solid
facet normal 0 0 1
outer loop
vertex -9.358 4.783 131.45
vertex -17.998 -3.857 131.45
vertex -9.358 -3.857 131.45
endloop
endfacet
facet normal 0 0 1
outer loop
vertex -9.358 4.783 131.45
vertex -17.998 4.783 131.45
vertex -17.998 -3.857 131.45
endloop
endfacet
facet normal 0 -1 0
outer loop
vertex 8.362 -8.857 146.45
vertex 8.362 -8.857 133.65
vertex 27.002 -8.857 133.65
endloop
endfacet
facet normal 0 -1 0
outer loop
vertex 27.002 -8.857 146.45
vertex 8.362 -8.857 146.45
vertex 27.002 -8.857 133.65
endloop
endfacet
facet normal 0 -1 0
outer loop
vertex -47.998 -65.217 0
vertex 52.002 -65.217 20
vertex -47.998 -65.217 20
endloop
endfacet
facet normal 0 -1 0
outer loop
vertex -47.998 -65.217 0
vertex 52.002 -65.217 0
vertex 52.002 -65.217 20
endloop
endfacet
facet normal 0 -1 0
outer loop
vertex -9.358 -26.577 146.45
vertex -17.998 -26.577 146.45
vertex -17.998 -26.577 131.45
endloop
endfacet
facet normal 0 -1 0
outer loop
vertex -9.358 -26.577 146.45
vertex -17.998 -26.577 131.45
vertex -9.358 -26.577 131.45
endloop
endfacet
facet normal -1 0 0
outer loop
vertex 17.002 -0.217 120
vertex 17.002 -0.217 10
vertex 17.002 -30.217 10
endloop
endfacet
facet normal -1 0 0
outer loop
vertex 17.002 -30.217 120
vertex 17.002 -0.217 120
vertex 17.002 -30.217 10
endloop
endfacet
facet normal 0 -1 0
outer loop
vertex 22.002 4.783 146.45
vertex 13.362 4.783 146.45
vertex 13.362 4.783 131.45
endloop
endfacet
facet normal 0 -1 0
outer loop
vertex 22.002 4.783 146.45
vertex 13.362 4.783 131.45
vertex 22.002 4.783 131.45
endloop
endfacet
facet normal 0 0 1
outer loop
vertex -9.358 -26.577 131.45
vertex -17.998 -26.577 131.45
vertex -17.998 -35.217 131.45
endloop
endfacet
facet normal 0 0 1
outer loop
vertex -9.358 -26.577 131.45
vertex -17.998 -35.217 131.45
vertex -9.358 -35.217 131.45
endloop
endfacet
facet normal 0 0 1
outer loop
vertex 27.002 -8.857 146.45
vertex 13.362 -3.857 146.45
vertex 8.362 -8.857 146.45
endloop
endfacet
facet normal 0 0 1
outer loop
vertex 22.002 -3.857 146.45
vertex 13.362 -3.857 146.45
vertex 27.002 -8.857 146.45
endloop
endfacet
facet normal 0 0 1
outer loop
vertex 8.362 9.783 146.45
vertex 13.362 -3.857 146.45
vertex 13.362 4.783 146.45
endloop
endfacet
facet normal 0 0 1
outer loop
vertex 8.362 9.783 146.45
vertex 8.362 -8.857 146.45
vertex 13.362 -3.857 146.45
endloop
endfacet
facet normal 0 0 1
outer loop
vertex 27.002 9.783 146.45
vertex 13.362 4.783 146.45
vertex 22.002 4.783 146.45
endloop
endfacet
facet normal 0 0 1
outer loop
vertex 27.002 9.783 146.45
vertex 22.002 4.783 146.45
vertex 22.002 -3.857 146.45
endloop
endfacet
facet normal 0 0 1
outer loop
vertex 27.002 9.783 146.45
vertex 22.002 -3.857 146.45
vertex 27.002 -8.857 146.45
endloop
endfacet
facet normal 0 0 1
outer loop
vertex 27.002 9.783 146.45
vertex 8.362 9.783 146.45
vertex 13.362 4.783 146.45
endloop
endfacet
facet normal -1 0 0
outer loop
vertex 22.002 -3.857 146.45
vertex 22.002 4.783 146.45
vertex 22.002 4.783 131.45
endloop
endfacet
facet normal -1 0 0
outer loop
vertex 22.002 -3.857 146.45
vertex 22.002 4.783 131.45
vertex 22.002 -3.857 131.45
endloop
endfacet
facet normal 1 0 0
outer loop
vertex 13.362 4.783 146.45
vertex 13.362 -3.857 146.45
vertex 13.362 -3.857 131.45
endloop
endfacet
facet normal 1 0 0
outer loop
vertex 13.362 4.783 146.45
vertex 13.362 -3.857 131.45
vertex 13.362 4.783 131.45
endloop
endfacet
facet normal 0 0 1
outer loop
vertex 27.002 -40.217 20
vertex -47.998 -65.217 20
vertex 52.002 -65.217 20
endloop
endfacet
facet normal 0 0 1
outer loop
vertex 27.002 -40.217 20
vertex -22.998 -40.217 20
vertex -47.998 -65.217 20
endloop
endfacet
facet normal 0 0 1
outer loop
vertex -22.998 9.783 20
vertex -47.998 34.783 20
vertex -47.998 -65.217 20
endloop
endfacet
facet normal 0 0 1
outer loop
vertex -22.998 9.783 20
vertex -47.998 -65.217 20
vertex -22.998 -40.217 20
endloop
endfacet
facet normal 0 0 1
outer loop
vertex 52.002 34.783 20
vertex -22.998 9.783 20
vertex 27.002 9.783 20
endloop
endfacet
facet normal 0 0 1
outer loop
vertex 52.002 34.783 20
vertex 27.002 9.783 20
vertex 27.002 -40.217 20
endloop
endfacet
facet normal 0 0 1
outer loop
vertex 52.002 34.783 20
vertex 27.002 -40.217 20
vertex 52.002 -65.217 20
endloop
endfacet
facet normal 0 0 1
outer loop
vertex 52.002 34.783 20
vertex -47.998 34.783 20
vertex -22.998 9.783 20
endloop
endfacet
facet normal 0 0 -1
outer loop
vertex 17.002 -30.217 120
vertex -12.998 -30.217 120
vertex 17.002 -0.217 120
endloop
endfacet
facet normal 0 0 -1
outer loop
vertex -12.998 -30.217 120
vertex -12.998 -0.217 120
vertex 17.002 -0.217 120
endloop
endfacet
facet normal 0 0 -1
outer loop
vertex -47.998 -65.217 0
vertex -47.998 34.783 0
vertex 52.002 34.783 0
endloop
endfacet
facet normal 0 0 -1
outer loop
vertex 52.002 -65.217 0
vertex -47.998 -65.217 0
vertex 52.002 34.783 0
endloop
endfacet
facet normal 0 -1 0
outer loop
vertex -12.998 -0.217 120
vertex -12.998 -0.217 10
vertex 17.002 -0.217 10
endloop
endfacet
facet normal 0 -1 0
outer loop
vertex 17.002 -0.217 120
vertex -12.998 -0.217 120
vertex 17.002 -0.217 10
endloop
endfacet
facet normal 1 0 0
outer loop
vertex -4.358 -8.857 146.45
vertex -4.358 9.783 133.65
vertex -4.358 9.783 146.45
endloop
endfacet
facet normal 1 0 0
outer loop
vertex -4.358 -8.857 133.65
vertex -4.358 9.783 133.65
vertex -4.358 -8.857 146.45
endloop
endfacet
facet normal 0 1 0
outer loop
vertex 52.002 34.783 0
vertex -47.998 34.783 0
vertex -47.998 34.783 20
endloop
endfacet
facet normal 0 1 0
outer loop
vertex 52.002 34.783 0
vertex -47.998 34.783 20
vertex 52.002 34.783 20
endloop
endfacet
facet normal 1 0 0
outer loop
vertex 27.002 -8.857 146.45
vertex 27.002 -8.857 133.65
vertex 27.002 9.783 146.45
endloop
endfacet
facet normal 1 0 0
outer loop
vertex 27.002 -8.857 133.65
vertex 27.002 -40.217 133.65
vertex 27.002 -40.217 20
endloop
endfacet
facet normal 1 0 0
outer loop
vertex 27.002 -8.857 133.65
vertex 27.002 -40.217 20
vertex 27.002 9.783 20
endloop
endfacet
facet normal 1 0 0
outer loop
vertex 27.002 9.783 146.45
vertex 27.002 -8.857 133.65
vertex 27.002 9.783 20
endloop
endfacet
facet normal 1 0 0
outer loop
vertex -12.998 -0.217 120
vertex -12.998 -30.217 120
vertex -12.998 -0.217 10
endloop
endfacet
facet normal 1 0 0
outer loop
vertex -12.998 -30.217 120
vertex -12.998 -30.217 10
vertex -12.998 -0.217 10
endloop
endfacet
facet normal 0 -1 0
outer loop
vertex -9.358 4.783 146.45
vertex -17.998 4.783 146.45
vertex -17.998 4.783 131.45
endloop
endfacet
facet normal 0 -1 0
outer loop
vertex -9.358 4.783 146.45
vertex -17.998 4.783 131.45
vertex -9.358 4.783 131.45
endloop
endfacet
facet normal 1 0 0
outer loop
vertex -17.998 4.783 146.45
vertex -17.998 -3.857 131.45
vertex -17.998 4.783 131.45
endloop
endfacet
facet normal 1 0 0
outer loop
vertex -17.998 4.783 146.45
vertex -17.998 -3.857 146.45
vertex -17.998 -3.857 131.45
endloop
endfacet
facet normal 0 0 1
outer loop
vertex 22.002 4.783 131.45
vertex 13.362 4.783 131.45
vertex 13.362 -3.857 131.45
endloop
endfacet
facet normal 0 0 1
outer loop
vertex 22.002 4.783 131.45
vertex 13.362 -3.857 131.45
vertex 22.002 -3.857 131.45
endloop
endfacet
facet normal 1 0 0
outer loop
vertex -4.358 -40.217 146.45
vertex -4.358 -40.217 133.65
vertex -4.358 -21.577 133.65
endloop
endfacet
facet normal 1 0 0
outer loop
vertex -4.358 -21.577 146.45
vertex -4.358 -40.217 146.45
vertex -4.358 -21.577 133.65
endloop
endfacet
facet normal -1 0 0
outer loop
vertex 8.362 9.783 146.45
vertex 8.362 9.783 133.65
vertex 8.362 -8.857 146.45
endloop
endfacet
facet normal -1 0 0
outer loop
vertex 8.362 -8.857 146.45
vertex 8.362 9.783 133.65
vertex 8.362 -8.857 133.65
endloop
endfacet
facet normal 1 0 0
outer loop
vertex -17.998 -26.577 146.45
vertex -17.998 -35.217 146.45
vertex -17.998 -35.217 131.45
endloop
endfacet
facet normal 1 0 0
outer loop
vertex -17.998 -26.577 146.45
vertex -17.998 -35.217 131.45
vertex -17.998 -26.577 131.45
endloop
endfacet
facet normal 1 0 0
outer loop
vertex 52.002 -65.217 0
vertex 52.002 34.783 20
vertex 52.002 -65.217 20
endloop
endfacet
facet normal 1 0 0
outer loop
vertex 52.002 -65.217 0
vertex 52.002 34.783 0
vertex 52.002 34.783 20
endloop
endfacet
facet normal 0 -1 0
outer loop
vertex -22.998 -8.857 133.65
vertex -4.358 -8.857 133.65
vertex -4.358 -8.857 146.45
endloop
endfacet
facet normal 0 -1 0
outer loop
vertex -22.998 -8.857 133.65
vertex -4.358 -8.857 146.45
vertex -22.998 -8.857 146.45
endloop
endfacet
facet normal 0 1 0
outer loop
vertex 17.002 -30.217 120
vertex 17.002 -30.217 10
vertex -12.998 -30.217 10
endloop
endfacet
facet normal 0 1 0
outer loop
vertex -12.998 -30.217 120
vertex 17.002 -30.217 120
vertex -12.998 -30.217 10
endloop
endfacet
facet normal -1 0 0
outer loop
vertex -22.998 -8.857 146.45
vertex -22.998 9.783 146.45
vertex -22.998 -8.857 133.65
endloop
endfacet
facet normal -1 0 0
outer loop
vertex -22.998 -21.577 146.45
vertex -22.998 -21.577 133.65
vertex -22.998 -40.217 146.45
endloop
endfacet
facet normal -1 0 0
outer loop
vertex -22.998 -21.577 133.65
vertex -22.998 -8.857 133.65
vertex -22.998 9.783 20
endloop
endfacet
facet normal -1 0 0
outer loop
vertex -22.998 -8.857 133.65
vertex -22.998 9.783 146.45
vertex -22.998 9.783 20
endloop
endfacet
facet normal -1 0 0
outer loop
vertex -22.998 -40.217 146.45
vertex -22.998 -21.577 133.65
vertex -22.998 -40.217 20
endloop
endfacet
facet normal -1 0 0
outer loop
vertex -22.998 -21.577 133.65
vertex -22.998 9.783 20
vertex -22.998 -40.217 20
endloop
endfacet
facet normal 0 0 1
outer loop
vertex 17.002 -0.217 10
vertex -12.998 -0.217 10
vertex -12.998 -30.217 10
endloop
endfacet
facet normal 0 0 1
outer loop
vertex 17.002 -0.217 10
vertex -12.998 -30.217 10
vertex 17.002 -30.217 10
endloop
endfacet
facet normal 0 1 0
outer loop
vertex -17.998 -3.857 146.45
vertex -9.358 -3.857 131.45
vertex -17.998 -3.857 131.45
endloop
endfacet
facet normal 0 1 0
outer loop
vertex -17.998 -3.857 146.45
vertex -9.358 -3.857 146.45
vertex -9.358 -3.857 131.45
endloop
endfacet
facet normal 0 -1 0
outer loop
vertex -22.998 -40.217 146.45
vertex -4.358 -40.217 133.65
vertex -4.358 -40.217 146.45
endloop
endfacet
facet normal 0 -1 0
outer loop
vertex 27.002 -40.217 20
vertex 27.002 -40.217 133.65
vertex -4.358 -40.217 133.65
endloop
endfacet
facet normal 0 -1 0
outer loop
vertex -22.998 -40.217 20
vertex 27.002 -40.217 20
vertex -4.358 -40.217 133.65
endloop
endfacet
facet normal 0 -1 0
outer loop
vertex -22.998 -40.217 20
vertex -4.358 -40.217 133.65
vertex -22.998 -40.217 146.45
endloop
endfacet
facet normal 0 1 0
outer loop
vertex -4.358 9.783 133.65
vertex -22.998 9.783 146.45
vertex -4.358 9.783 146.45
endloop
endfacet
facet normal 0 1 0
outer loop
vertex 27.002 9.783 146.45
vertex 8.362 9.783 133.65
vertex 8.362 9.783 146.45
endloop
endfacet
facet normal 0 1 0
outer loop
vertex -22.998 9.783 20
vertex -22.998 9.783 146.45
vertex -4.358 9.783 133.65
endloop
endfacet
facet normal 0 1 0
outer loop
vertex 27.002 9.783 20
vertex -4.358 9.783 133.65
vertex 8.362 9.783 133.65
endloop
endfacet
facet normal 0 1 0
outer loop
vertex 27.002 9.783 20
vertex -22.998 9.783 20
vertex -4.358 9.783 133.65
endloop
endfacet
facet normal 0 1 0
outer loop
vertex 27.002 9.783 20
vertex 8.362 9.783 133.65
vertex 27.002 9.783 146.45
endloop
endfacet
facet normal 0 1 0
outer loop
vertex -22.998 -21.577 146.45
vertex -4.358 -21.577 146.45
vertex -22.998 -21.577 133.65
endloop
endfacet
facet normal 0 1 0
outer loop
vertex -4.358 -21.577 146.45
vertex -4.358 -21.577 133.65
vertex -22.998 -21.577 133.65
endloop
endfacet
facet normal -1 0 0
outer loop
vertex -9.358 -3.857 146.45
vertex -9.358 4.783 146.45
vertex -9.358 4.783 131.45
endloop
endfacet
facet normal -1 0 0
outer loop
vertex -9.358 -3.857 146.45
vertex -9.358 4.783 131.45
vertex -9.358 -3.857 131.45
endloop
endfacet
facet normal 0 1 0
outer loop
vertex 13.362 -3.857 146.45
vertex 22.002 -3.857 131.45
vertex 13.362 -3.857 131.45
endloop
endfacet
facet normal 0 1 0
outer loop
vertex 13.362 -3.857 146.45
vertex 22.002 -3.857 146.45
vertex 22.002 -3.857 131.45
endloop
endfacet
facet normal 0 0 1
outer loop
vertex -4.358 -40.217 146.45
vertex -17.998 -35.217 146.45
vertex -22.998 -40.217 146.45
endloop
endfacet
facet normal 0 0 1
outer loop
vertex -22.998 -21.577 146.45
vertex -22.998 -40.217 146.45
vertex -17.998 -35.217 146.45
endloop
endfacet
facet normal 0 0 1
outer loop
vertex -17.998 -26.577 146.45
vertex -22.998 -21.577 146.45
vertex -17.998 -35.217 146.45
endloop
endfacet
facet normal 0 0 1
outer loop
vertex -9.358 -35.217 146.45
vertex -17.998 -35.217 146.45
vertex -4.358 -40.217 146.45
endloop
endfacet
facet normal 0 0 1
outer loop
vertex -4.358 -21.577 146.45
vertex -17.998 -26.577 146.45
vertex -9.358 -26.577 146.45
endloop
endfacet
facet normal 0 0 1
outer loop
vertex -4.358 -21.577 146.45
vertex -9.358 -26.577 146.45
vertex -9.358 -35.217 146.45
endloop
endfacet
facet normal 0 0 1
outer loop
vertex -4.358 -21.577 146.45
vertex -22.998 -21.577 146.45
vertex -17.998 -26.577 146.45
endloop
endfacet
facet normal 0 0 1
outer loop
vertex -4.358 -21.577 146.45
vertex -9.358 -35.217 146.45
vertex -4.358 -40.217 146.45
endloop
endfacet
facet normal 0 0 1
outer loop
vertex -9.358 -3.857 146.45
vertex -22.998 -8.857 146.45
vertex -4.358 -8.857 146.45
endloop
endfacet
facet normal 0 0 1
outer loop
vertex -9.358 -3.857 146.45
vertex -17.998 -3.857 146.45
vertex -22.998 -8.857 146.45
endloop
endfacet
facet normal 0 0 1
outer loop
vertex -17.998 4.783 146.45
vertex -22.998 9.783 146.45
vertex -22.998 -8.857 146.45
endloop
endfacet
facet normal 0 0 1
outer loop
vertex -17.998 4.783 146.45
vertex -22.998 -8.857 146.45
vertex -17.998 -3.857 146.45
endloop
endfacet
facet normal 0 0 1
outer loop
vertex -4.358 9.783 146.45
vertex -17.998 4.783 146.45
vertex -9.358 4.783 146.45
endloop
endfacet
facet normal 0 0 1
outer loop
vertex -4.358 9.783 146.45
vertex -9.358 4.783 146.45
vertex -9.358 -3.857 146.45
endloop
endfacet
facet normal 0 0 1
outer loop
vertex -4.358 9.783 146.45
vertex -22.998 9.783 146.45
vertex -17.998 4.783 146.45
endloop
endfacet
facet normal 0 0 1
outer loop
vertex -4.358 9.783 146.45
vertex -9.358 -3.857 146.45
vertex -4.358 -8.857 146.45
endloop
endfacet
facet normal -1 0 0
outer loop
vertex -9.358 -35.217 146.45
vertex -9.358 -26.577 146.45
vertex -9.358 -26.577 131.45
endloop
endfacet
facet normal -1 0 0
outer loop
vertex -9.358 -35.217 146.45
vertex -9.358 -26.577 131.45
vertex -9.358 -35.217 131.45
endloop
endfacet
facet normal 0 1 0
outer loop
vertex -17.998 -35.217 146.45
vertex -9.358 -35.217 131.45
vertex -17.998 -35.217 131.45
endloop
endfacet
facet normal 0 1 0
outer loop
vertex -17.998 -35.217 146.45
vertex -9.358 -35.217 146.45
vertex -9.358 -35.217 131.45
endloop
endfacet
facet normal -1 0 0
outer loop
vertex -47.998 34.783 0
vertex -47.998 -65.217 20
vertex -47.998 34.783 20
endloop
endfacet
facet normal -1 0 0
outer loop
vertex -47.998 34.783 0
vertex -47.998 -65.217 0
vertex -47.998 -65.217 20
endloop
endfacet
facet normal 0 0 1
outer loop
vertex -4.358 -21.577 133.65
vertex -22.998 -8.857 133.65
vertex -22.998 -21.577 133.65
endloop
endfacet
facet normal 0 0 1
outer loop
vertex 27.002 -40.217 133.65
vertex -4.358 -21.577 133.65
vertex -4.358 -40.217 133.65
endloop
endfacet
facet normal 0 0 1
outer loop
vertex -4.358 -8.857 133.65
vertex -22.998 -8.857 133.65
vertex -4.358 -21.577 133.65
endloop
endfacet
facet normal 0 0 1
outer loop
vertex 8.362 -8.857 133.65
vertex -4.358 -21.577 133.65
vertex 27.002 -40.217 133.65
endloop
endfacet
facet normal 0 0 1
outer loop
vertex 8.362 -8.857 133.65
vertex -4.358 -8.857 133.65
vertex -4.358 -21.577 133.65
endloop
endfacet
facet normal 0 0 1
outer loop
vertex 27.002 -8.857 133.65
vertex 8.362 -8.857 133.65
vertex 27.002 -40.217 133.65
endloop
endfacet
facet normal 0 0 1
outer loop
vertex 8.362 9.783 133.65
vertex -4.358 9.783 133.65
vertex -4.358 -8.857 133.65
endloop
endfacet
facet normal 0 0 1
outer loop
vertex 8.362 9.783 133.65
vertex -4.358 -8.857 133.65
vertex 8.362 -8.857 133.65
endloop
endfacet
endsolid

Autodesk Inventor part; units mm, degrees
ref_plane "YZ Plane" through (0, 0, 0) normal (1, 0, 0) x (0, 1, 0)
ref_plane "XZ Plane" through (0, 0, 0) normal (0, 1, 0) x (-1, 0, 0)
ref_plane "XY Plane" through (0, 0, 0) normal (0, 0, 1) x (1, 0, 0)
sketch "Sketch1" plane through (0, 0, 0) normal (0, 0, 1) x (1, 0, 0)
  line L0 (-47.9977, 34.7826) -> (52.0023, 34.7826)
  line L1 (52.0023, 34.7826) -> (52.0023, -65.2174)
  line L2 (52.0023, -65.2174) -> (-47.9977, -65.2174)
  line L3 (-47.9977, -65.2174) -> (-47.9977, 34.7826)
  point P0 (0, 0)
  dimension "d0" = 100
  dimension "d1" = 100
  dimension "d2" = 100
extrude "Extrusion1" add sketch "Sketch1" along normal blind 20
sketch "Sketch2" plane through (0, 0, 20) normal (0, 0, 1) x (1, 0, 0)
  line L0 (-22.9977, 9.7826) -> (27.0023, 9.7826)
  line L1 (27.0023, 9.7826) -> (27.0023, -40.2174)
  line L2 (27.0023, -40.2174) -> (-22.9977, -40.2174)
  line L3 (-22.9977, -40.2174) -> (-22.9977, 9.7826)
  line L4 (52.0023, 34.7826) -> (-47.9977, 34.7826) projected
  line L5 (-47.9977, 34.7826) -> (-47.9977, -65.2174) projected
  line L6 (-47.9977, -65.2174) -> (52.0023, -65.2174) projected
  line L7 (52.0023, -65.2174) -> (52.0023, 34.7826) projected
  point P0 (0, 0)
  dimension "d5" = 25
  dimension "d6" = 25
  dimension "d7" = 25
  dimension "d8" = 25
extrude "Extrusion2" add sketch "Sketch2" along normal blind 100 contours L0 L1 L2 L3
shell "Shell1" thickness 10 removed faces 1 at (-6.331, -6.8841, 120)
sketch "Sketch3" plane through (0, 0, 120) normal (0, 0, 1) x (1, 0, 0)
  line L0 (-22.9977, 9.7826) -> (-22.9977, -40.2174) projected
  line L1 (27.0023, -40.2174) -> (27.0023, 9.7826) projected
  line L2 (-22.9977, 9.7826) -> (27.0023, 9.7826)
  line L3 (27.0023, 9.7826) -> (27.0023, -40.2174)
  line L4 (27.0023, -40.2174) -> (-22.9977, -40.2174)
  line L5 (-22.9977, -40.2174) -> (-22.9977, 9.7826)
  point P0 (0, 0)
extrude "Extrusion3" add sketch "Sketch3" along normal blind 13.65
sketch "Sketch4" plane through (0, 0, 133.65) normal (0, 0, 1) x (1, 0, 0)
  line L0 (-22.9977, 9.7826) -> (-4.3577, 9.7826)
  line L1 (-4.3577, 9.7826) -> (-4.3577, -8.8574)
  line L2 (-4.3577, -8.8574) -> (-22.9977, -8.8574)
  line L3 (-22.9977, -8.8574) -> (-22.9977, 9.7826)
  line L4 (27.0023, 9.7826) -> (8.3623, 9.7826)
  line L5 (8.3623, 9.7826) -> (8.3623, -8.8574)
  line L6 (8.3623, -8.8574) -> (27.0023, -8.8574)
  line L7 (27.0023, -8.8574) -> (27.0023, 9.7826)
  line L8 (27.0023, -40.2174) -> (-22.9977, -40.2174) projected
  line L9 (-22.9977, -40.2174) -> (-4.3577, -40.2174)
  line L10 (-4.3577, -40.2174) -> (-4.3577, -21.5774)
  line L11 (-4.3577, -21.5774) -> (-22.9977, -21.5774)
  line L12 (-22.9977, -21.5774) -> (-22.9977, -40.2174)
  point P0 (0, 0)
  dimension "d14" = 18.64
  dimension "d15" = 18.64
  dimension "d16" = 18.64
  dimension "d17" = 18.64
  dimension "d18" = 18.64
extrude "Extrusion4" add sketch "Sketch4" along normal blind 12.8
sketch "Sketch5" plane through (0, 0, 146.45) normal (0, 0, 1) x (1, 0, 0)
  line L0 (13.3623, 4.7826) -> (22.0023, 4.7826)
  line L1 (22.0023, 4.7826) -> (22.0023, -3.8574)
  line L2 (22.0023, -3.8574) -> (13.3623, -3.8574)
  line L3 (13.3623, -3.8574) -> (13.3623, 4.7826)
  line L4 (-17.9977, 4.7826) -> (-9.3577, 4.7826)
  line L5 (-9.3577, 4.7826) -> (-9.3577, -3.8574)
  line L6 (-9.3577, -3.8574) -> (-17.9977, -3.8574)
  line L7 (-17.9977, -3.8574) -> (-17.9977, 4.7826)
  line L8 (-17.9977, -26.5774) -> (-9.3577, -26.5774)
  line L9 (-9.3577, -26.5774) -> (-9.3577, -35.2174)
  line L10 (-9.3577, -35.2174) -> (-17.9977, -35.2174)
  line L11 (-17.9977, -35.2174) -> (-17.9977, -26.5774)
  line L12 (-4.3577, 9.7826) -> (-22.9977, 9.7826) projected
  line L13 (-22.9977, 9.7826) -> (-22.9977, -8.8574) projected
  line L14 (-22.9977, -8.8574) -> (-4.3577, -8.8574) projected
  line L15 (-4.3577, -8.8574) -> (-4.3577, 9.7826) projected
  line L16 (27.0023, 9.7826) -> (8.3623, 9.7826) projected
  line L17 (27.0023, -8.8574) -> (27.0023, 9.7826) projected
  line L18 (8.3623, 9.7826) -> (8.3623, -8.8574) projected
  line L19 (-4.3577, -21.5774) -> (-22.9977, -21.5774) projected
  line L20 (-22.9977, -40.2174) -> (-4.3577, -40.2174) projected
  point P0 (0, 0)
  dimension "d21" = 5
  dimension "d22" = 5
  dimension "d23" = 5
  dimension "d24" = 5
  dimension "d25" = 5
  dimension "d26" = 5
  dimension "d27" = 5
  dimension "d28" = 5
  dimension "d29" = 5
extrude "Extrusion5" cut sketch "Sketch5" against normal blind 15 contours L0 L1 L2 L3 | L4 L5 L6 L7 | L8 L9 L10 L11
equation "\"d1\" = d0"
equation "\"d6\" = d5"
equation "\"d7\" = d5"
equation "\"d8\" = d5"
equation "\"d15\" = d14"
equation "\"d16\" = d14"
equation "\"d18\" = d14"
equation "\"d22\" = d21"
equation "\"d23\" = d21"
equation "\"d24\" = d21"
equation "\"d26\" = d21"
equation "\"d27\" = d21"
equation "\"d28\" = d21"
equation "\"d29\" = d21"
properties part number "final_beam_cube"
